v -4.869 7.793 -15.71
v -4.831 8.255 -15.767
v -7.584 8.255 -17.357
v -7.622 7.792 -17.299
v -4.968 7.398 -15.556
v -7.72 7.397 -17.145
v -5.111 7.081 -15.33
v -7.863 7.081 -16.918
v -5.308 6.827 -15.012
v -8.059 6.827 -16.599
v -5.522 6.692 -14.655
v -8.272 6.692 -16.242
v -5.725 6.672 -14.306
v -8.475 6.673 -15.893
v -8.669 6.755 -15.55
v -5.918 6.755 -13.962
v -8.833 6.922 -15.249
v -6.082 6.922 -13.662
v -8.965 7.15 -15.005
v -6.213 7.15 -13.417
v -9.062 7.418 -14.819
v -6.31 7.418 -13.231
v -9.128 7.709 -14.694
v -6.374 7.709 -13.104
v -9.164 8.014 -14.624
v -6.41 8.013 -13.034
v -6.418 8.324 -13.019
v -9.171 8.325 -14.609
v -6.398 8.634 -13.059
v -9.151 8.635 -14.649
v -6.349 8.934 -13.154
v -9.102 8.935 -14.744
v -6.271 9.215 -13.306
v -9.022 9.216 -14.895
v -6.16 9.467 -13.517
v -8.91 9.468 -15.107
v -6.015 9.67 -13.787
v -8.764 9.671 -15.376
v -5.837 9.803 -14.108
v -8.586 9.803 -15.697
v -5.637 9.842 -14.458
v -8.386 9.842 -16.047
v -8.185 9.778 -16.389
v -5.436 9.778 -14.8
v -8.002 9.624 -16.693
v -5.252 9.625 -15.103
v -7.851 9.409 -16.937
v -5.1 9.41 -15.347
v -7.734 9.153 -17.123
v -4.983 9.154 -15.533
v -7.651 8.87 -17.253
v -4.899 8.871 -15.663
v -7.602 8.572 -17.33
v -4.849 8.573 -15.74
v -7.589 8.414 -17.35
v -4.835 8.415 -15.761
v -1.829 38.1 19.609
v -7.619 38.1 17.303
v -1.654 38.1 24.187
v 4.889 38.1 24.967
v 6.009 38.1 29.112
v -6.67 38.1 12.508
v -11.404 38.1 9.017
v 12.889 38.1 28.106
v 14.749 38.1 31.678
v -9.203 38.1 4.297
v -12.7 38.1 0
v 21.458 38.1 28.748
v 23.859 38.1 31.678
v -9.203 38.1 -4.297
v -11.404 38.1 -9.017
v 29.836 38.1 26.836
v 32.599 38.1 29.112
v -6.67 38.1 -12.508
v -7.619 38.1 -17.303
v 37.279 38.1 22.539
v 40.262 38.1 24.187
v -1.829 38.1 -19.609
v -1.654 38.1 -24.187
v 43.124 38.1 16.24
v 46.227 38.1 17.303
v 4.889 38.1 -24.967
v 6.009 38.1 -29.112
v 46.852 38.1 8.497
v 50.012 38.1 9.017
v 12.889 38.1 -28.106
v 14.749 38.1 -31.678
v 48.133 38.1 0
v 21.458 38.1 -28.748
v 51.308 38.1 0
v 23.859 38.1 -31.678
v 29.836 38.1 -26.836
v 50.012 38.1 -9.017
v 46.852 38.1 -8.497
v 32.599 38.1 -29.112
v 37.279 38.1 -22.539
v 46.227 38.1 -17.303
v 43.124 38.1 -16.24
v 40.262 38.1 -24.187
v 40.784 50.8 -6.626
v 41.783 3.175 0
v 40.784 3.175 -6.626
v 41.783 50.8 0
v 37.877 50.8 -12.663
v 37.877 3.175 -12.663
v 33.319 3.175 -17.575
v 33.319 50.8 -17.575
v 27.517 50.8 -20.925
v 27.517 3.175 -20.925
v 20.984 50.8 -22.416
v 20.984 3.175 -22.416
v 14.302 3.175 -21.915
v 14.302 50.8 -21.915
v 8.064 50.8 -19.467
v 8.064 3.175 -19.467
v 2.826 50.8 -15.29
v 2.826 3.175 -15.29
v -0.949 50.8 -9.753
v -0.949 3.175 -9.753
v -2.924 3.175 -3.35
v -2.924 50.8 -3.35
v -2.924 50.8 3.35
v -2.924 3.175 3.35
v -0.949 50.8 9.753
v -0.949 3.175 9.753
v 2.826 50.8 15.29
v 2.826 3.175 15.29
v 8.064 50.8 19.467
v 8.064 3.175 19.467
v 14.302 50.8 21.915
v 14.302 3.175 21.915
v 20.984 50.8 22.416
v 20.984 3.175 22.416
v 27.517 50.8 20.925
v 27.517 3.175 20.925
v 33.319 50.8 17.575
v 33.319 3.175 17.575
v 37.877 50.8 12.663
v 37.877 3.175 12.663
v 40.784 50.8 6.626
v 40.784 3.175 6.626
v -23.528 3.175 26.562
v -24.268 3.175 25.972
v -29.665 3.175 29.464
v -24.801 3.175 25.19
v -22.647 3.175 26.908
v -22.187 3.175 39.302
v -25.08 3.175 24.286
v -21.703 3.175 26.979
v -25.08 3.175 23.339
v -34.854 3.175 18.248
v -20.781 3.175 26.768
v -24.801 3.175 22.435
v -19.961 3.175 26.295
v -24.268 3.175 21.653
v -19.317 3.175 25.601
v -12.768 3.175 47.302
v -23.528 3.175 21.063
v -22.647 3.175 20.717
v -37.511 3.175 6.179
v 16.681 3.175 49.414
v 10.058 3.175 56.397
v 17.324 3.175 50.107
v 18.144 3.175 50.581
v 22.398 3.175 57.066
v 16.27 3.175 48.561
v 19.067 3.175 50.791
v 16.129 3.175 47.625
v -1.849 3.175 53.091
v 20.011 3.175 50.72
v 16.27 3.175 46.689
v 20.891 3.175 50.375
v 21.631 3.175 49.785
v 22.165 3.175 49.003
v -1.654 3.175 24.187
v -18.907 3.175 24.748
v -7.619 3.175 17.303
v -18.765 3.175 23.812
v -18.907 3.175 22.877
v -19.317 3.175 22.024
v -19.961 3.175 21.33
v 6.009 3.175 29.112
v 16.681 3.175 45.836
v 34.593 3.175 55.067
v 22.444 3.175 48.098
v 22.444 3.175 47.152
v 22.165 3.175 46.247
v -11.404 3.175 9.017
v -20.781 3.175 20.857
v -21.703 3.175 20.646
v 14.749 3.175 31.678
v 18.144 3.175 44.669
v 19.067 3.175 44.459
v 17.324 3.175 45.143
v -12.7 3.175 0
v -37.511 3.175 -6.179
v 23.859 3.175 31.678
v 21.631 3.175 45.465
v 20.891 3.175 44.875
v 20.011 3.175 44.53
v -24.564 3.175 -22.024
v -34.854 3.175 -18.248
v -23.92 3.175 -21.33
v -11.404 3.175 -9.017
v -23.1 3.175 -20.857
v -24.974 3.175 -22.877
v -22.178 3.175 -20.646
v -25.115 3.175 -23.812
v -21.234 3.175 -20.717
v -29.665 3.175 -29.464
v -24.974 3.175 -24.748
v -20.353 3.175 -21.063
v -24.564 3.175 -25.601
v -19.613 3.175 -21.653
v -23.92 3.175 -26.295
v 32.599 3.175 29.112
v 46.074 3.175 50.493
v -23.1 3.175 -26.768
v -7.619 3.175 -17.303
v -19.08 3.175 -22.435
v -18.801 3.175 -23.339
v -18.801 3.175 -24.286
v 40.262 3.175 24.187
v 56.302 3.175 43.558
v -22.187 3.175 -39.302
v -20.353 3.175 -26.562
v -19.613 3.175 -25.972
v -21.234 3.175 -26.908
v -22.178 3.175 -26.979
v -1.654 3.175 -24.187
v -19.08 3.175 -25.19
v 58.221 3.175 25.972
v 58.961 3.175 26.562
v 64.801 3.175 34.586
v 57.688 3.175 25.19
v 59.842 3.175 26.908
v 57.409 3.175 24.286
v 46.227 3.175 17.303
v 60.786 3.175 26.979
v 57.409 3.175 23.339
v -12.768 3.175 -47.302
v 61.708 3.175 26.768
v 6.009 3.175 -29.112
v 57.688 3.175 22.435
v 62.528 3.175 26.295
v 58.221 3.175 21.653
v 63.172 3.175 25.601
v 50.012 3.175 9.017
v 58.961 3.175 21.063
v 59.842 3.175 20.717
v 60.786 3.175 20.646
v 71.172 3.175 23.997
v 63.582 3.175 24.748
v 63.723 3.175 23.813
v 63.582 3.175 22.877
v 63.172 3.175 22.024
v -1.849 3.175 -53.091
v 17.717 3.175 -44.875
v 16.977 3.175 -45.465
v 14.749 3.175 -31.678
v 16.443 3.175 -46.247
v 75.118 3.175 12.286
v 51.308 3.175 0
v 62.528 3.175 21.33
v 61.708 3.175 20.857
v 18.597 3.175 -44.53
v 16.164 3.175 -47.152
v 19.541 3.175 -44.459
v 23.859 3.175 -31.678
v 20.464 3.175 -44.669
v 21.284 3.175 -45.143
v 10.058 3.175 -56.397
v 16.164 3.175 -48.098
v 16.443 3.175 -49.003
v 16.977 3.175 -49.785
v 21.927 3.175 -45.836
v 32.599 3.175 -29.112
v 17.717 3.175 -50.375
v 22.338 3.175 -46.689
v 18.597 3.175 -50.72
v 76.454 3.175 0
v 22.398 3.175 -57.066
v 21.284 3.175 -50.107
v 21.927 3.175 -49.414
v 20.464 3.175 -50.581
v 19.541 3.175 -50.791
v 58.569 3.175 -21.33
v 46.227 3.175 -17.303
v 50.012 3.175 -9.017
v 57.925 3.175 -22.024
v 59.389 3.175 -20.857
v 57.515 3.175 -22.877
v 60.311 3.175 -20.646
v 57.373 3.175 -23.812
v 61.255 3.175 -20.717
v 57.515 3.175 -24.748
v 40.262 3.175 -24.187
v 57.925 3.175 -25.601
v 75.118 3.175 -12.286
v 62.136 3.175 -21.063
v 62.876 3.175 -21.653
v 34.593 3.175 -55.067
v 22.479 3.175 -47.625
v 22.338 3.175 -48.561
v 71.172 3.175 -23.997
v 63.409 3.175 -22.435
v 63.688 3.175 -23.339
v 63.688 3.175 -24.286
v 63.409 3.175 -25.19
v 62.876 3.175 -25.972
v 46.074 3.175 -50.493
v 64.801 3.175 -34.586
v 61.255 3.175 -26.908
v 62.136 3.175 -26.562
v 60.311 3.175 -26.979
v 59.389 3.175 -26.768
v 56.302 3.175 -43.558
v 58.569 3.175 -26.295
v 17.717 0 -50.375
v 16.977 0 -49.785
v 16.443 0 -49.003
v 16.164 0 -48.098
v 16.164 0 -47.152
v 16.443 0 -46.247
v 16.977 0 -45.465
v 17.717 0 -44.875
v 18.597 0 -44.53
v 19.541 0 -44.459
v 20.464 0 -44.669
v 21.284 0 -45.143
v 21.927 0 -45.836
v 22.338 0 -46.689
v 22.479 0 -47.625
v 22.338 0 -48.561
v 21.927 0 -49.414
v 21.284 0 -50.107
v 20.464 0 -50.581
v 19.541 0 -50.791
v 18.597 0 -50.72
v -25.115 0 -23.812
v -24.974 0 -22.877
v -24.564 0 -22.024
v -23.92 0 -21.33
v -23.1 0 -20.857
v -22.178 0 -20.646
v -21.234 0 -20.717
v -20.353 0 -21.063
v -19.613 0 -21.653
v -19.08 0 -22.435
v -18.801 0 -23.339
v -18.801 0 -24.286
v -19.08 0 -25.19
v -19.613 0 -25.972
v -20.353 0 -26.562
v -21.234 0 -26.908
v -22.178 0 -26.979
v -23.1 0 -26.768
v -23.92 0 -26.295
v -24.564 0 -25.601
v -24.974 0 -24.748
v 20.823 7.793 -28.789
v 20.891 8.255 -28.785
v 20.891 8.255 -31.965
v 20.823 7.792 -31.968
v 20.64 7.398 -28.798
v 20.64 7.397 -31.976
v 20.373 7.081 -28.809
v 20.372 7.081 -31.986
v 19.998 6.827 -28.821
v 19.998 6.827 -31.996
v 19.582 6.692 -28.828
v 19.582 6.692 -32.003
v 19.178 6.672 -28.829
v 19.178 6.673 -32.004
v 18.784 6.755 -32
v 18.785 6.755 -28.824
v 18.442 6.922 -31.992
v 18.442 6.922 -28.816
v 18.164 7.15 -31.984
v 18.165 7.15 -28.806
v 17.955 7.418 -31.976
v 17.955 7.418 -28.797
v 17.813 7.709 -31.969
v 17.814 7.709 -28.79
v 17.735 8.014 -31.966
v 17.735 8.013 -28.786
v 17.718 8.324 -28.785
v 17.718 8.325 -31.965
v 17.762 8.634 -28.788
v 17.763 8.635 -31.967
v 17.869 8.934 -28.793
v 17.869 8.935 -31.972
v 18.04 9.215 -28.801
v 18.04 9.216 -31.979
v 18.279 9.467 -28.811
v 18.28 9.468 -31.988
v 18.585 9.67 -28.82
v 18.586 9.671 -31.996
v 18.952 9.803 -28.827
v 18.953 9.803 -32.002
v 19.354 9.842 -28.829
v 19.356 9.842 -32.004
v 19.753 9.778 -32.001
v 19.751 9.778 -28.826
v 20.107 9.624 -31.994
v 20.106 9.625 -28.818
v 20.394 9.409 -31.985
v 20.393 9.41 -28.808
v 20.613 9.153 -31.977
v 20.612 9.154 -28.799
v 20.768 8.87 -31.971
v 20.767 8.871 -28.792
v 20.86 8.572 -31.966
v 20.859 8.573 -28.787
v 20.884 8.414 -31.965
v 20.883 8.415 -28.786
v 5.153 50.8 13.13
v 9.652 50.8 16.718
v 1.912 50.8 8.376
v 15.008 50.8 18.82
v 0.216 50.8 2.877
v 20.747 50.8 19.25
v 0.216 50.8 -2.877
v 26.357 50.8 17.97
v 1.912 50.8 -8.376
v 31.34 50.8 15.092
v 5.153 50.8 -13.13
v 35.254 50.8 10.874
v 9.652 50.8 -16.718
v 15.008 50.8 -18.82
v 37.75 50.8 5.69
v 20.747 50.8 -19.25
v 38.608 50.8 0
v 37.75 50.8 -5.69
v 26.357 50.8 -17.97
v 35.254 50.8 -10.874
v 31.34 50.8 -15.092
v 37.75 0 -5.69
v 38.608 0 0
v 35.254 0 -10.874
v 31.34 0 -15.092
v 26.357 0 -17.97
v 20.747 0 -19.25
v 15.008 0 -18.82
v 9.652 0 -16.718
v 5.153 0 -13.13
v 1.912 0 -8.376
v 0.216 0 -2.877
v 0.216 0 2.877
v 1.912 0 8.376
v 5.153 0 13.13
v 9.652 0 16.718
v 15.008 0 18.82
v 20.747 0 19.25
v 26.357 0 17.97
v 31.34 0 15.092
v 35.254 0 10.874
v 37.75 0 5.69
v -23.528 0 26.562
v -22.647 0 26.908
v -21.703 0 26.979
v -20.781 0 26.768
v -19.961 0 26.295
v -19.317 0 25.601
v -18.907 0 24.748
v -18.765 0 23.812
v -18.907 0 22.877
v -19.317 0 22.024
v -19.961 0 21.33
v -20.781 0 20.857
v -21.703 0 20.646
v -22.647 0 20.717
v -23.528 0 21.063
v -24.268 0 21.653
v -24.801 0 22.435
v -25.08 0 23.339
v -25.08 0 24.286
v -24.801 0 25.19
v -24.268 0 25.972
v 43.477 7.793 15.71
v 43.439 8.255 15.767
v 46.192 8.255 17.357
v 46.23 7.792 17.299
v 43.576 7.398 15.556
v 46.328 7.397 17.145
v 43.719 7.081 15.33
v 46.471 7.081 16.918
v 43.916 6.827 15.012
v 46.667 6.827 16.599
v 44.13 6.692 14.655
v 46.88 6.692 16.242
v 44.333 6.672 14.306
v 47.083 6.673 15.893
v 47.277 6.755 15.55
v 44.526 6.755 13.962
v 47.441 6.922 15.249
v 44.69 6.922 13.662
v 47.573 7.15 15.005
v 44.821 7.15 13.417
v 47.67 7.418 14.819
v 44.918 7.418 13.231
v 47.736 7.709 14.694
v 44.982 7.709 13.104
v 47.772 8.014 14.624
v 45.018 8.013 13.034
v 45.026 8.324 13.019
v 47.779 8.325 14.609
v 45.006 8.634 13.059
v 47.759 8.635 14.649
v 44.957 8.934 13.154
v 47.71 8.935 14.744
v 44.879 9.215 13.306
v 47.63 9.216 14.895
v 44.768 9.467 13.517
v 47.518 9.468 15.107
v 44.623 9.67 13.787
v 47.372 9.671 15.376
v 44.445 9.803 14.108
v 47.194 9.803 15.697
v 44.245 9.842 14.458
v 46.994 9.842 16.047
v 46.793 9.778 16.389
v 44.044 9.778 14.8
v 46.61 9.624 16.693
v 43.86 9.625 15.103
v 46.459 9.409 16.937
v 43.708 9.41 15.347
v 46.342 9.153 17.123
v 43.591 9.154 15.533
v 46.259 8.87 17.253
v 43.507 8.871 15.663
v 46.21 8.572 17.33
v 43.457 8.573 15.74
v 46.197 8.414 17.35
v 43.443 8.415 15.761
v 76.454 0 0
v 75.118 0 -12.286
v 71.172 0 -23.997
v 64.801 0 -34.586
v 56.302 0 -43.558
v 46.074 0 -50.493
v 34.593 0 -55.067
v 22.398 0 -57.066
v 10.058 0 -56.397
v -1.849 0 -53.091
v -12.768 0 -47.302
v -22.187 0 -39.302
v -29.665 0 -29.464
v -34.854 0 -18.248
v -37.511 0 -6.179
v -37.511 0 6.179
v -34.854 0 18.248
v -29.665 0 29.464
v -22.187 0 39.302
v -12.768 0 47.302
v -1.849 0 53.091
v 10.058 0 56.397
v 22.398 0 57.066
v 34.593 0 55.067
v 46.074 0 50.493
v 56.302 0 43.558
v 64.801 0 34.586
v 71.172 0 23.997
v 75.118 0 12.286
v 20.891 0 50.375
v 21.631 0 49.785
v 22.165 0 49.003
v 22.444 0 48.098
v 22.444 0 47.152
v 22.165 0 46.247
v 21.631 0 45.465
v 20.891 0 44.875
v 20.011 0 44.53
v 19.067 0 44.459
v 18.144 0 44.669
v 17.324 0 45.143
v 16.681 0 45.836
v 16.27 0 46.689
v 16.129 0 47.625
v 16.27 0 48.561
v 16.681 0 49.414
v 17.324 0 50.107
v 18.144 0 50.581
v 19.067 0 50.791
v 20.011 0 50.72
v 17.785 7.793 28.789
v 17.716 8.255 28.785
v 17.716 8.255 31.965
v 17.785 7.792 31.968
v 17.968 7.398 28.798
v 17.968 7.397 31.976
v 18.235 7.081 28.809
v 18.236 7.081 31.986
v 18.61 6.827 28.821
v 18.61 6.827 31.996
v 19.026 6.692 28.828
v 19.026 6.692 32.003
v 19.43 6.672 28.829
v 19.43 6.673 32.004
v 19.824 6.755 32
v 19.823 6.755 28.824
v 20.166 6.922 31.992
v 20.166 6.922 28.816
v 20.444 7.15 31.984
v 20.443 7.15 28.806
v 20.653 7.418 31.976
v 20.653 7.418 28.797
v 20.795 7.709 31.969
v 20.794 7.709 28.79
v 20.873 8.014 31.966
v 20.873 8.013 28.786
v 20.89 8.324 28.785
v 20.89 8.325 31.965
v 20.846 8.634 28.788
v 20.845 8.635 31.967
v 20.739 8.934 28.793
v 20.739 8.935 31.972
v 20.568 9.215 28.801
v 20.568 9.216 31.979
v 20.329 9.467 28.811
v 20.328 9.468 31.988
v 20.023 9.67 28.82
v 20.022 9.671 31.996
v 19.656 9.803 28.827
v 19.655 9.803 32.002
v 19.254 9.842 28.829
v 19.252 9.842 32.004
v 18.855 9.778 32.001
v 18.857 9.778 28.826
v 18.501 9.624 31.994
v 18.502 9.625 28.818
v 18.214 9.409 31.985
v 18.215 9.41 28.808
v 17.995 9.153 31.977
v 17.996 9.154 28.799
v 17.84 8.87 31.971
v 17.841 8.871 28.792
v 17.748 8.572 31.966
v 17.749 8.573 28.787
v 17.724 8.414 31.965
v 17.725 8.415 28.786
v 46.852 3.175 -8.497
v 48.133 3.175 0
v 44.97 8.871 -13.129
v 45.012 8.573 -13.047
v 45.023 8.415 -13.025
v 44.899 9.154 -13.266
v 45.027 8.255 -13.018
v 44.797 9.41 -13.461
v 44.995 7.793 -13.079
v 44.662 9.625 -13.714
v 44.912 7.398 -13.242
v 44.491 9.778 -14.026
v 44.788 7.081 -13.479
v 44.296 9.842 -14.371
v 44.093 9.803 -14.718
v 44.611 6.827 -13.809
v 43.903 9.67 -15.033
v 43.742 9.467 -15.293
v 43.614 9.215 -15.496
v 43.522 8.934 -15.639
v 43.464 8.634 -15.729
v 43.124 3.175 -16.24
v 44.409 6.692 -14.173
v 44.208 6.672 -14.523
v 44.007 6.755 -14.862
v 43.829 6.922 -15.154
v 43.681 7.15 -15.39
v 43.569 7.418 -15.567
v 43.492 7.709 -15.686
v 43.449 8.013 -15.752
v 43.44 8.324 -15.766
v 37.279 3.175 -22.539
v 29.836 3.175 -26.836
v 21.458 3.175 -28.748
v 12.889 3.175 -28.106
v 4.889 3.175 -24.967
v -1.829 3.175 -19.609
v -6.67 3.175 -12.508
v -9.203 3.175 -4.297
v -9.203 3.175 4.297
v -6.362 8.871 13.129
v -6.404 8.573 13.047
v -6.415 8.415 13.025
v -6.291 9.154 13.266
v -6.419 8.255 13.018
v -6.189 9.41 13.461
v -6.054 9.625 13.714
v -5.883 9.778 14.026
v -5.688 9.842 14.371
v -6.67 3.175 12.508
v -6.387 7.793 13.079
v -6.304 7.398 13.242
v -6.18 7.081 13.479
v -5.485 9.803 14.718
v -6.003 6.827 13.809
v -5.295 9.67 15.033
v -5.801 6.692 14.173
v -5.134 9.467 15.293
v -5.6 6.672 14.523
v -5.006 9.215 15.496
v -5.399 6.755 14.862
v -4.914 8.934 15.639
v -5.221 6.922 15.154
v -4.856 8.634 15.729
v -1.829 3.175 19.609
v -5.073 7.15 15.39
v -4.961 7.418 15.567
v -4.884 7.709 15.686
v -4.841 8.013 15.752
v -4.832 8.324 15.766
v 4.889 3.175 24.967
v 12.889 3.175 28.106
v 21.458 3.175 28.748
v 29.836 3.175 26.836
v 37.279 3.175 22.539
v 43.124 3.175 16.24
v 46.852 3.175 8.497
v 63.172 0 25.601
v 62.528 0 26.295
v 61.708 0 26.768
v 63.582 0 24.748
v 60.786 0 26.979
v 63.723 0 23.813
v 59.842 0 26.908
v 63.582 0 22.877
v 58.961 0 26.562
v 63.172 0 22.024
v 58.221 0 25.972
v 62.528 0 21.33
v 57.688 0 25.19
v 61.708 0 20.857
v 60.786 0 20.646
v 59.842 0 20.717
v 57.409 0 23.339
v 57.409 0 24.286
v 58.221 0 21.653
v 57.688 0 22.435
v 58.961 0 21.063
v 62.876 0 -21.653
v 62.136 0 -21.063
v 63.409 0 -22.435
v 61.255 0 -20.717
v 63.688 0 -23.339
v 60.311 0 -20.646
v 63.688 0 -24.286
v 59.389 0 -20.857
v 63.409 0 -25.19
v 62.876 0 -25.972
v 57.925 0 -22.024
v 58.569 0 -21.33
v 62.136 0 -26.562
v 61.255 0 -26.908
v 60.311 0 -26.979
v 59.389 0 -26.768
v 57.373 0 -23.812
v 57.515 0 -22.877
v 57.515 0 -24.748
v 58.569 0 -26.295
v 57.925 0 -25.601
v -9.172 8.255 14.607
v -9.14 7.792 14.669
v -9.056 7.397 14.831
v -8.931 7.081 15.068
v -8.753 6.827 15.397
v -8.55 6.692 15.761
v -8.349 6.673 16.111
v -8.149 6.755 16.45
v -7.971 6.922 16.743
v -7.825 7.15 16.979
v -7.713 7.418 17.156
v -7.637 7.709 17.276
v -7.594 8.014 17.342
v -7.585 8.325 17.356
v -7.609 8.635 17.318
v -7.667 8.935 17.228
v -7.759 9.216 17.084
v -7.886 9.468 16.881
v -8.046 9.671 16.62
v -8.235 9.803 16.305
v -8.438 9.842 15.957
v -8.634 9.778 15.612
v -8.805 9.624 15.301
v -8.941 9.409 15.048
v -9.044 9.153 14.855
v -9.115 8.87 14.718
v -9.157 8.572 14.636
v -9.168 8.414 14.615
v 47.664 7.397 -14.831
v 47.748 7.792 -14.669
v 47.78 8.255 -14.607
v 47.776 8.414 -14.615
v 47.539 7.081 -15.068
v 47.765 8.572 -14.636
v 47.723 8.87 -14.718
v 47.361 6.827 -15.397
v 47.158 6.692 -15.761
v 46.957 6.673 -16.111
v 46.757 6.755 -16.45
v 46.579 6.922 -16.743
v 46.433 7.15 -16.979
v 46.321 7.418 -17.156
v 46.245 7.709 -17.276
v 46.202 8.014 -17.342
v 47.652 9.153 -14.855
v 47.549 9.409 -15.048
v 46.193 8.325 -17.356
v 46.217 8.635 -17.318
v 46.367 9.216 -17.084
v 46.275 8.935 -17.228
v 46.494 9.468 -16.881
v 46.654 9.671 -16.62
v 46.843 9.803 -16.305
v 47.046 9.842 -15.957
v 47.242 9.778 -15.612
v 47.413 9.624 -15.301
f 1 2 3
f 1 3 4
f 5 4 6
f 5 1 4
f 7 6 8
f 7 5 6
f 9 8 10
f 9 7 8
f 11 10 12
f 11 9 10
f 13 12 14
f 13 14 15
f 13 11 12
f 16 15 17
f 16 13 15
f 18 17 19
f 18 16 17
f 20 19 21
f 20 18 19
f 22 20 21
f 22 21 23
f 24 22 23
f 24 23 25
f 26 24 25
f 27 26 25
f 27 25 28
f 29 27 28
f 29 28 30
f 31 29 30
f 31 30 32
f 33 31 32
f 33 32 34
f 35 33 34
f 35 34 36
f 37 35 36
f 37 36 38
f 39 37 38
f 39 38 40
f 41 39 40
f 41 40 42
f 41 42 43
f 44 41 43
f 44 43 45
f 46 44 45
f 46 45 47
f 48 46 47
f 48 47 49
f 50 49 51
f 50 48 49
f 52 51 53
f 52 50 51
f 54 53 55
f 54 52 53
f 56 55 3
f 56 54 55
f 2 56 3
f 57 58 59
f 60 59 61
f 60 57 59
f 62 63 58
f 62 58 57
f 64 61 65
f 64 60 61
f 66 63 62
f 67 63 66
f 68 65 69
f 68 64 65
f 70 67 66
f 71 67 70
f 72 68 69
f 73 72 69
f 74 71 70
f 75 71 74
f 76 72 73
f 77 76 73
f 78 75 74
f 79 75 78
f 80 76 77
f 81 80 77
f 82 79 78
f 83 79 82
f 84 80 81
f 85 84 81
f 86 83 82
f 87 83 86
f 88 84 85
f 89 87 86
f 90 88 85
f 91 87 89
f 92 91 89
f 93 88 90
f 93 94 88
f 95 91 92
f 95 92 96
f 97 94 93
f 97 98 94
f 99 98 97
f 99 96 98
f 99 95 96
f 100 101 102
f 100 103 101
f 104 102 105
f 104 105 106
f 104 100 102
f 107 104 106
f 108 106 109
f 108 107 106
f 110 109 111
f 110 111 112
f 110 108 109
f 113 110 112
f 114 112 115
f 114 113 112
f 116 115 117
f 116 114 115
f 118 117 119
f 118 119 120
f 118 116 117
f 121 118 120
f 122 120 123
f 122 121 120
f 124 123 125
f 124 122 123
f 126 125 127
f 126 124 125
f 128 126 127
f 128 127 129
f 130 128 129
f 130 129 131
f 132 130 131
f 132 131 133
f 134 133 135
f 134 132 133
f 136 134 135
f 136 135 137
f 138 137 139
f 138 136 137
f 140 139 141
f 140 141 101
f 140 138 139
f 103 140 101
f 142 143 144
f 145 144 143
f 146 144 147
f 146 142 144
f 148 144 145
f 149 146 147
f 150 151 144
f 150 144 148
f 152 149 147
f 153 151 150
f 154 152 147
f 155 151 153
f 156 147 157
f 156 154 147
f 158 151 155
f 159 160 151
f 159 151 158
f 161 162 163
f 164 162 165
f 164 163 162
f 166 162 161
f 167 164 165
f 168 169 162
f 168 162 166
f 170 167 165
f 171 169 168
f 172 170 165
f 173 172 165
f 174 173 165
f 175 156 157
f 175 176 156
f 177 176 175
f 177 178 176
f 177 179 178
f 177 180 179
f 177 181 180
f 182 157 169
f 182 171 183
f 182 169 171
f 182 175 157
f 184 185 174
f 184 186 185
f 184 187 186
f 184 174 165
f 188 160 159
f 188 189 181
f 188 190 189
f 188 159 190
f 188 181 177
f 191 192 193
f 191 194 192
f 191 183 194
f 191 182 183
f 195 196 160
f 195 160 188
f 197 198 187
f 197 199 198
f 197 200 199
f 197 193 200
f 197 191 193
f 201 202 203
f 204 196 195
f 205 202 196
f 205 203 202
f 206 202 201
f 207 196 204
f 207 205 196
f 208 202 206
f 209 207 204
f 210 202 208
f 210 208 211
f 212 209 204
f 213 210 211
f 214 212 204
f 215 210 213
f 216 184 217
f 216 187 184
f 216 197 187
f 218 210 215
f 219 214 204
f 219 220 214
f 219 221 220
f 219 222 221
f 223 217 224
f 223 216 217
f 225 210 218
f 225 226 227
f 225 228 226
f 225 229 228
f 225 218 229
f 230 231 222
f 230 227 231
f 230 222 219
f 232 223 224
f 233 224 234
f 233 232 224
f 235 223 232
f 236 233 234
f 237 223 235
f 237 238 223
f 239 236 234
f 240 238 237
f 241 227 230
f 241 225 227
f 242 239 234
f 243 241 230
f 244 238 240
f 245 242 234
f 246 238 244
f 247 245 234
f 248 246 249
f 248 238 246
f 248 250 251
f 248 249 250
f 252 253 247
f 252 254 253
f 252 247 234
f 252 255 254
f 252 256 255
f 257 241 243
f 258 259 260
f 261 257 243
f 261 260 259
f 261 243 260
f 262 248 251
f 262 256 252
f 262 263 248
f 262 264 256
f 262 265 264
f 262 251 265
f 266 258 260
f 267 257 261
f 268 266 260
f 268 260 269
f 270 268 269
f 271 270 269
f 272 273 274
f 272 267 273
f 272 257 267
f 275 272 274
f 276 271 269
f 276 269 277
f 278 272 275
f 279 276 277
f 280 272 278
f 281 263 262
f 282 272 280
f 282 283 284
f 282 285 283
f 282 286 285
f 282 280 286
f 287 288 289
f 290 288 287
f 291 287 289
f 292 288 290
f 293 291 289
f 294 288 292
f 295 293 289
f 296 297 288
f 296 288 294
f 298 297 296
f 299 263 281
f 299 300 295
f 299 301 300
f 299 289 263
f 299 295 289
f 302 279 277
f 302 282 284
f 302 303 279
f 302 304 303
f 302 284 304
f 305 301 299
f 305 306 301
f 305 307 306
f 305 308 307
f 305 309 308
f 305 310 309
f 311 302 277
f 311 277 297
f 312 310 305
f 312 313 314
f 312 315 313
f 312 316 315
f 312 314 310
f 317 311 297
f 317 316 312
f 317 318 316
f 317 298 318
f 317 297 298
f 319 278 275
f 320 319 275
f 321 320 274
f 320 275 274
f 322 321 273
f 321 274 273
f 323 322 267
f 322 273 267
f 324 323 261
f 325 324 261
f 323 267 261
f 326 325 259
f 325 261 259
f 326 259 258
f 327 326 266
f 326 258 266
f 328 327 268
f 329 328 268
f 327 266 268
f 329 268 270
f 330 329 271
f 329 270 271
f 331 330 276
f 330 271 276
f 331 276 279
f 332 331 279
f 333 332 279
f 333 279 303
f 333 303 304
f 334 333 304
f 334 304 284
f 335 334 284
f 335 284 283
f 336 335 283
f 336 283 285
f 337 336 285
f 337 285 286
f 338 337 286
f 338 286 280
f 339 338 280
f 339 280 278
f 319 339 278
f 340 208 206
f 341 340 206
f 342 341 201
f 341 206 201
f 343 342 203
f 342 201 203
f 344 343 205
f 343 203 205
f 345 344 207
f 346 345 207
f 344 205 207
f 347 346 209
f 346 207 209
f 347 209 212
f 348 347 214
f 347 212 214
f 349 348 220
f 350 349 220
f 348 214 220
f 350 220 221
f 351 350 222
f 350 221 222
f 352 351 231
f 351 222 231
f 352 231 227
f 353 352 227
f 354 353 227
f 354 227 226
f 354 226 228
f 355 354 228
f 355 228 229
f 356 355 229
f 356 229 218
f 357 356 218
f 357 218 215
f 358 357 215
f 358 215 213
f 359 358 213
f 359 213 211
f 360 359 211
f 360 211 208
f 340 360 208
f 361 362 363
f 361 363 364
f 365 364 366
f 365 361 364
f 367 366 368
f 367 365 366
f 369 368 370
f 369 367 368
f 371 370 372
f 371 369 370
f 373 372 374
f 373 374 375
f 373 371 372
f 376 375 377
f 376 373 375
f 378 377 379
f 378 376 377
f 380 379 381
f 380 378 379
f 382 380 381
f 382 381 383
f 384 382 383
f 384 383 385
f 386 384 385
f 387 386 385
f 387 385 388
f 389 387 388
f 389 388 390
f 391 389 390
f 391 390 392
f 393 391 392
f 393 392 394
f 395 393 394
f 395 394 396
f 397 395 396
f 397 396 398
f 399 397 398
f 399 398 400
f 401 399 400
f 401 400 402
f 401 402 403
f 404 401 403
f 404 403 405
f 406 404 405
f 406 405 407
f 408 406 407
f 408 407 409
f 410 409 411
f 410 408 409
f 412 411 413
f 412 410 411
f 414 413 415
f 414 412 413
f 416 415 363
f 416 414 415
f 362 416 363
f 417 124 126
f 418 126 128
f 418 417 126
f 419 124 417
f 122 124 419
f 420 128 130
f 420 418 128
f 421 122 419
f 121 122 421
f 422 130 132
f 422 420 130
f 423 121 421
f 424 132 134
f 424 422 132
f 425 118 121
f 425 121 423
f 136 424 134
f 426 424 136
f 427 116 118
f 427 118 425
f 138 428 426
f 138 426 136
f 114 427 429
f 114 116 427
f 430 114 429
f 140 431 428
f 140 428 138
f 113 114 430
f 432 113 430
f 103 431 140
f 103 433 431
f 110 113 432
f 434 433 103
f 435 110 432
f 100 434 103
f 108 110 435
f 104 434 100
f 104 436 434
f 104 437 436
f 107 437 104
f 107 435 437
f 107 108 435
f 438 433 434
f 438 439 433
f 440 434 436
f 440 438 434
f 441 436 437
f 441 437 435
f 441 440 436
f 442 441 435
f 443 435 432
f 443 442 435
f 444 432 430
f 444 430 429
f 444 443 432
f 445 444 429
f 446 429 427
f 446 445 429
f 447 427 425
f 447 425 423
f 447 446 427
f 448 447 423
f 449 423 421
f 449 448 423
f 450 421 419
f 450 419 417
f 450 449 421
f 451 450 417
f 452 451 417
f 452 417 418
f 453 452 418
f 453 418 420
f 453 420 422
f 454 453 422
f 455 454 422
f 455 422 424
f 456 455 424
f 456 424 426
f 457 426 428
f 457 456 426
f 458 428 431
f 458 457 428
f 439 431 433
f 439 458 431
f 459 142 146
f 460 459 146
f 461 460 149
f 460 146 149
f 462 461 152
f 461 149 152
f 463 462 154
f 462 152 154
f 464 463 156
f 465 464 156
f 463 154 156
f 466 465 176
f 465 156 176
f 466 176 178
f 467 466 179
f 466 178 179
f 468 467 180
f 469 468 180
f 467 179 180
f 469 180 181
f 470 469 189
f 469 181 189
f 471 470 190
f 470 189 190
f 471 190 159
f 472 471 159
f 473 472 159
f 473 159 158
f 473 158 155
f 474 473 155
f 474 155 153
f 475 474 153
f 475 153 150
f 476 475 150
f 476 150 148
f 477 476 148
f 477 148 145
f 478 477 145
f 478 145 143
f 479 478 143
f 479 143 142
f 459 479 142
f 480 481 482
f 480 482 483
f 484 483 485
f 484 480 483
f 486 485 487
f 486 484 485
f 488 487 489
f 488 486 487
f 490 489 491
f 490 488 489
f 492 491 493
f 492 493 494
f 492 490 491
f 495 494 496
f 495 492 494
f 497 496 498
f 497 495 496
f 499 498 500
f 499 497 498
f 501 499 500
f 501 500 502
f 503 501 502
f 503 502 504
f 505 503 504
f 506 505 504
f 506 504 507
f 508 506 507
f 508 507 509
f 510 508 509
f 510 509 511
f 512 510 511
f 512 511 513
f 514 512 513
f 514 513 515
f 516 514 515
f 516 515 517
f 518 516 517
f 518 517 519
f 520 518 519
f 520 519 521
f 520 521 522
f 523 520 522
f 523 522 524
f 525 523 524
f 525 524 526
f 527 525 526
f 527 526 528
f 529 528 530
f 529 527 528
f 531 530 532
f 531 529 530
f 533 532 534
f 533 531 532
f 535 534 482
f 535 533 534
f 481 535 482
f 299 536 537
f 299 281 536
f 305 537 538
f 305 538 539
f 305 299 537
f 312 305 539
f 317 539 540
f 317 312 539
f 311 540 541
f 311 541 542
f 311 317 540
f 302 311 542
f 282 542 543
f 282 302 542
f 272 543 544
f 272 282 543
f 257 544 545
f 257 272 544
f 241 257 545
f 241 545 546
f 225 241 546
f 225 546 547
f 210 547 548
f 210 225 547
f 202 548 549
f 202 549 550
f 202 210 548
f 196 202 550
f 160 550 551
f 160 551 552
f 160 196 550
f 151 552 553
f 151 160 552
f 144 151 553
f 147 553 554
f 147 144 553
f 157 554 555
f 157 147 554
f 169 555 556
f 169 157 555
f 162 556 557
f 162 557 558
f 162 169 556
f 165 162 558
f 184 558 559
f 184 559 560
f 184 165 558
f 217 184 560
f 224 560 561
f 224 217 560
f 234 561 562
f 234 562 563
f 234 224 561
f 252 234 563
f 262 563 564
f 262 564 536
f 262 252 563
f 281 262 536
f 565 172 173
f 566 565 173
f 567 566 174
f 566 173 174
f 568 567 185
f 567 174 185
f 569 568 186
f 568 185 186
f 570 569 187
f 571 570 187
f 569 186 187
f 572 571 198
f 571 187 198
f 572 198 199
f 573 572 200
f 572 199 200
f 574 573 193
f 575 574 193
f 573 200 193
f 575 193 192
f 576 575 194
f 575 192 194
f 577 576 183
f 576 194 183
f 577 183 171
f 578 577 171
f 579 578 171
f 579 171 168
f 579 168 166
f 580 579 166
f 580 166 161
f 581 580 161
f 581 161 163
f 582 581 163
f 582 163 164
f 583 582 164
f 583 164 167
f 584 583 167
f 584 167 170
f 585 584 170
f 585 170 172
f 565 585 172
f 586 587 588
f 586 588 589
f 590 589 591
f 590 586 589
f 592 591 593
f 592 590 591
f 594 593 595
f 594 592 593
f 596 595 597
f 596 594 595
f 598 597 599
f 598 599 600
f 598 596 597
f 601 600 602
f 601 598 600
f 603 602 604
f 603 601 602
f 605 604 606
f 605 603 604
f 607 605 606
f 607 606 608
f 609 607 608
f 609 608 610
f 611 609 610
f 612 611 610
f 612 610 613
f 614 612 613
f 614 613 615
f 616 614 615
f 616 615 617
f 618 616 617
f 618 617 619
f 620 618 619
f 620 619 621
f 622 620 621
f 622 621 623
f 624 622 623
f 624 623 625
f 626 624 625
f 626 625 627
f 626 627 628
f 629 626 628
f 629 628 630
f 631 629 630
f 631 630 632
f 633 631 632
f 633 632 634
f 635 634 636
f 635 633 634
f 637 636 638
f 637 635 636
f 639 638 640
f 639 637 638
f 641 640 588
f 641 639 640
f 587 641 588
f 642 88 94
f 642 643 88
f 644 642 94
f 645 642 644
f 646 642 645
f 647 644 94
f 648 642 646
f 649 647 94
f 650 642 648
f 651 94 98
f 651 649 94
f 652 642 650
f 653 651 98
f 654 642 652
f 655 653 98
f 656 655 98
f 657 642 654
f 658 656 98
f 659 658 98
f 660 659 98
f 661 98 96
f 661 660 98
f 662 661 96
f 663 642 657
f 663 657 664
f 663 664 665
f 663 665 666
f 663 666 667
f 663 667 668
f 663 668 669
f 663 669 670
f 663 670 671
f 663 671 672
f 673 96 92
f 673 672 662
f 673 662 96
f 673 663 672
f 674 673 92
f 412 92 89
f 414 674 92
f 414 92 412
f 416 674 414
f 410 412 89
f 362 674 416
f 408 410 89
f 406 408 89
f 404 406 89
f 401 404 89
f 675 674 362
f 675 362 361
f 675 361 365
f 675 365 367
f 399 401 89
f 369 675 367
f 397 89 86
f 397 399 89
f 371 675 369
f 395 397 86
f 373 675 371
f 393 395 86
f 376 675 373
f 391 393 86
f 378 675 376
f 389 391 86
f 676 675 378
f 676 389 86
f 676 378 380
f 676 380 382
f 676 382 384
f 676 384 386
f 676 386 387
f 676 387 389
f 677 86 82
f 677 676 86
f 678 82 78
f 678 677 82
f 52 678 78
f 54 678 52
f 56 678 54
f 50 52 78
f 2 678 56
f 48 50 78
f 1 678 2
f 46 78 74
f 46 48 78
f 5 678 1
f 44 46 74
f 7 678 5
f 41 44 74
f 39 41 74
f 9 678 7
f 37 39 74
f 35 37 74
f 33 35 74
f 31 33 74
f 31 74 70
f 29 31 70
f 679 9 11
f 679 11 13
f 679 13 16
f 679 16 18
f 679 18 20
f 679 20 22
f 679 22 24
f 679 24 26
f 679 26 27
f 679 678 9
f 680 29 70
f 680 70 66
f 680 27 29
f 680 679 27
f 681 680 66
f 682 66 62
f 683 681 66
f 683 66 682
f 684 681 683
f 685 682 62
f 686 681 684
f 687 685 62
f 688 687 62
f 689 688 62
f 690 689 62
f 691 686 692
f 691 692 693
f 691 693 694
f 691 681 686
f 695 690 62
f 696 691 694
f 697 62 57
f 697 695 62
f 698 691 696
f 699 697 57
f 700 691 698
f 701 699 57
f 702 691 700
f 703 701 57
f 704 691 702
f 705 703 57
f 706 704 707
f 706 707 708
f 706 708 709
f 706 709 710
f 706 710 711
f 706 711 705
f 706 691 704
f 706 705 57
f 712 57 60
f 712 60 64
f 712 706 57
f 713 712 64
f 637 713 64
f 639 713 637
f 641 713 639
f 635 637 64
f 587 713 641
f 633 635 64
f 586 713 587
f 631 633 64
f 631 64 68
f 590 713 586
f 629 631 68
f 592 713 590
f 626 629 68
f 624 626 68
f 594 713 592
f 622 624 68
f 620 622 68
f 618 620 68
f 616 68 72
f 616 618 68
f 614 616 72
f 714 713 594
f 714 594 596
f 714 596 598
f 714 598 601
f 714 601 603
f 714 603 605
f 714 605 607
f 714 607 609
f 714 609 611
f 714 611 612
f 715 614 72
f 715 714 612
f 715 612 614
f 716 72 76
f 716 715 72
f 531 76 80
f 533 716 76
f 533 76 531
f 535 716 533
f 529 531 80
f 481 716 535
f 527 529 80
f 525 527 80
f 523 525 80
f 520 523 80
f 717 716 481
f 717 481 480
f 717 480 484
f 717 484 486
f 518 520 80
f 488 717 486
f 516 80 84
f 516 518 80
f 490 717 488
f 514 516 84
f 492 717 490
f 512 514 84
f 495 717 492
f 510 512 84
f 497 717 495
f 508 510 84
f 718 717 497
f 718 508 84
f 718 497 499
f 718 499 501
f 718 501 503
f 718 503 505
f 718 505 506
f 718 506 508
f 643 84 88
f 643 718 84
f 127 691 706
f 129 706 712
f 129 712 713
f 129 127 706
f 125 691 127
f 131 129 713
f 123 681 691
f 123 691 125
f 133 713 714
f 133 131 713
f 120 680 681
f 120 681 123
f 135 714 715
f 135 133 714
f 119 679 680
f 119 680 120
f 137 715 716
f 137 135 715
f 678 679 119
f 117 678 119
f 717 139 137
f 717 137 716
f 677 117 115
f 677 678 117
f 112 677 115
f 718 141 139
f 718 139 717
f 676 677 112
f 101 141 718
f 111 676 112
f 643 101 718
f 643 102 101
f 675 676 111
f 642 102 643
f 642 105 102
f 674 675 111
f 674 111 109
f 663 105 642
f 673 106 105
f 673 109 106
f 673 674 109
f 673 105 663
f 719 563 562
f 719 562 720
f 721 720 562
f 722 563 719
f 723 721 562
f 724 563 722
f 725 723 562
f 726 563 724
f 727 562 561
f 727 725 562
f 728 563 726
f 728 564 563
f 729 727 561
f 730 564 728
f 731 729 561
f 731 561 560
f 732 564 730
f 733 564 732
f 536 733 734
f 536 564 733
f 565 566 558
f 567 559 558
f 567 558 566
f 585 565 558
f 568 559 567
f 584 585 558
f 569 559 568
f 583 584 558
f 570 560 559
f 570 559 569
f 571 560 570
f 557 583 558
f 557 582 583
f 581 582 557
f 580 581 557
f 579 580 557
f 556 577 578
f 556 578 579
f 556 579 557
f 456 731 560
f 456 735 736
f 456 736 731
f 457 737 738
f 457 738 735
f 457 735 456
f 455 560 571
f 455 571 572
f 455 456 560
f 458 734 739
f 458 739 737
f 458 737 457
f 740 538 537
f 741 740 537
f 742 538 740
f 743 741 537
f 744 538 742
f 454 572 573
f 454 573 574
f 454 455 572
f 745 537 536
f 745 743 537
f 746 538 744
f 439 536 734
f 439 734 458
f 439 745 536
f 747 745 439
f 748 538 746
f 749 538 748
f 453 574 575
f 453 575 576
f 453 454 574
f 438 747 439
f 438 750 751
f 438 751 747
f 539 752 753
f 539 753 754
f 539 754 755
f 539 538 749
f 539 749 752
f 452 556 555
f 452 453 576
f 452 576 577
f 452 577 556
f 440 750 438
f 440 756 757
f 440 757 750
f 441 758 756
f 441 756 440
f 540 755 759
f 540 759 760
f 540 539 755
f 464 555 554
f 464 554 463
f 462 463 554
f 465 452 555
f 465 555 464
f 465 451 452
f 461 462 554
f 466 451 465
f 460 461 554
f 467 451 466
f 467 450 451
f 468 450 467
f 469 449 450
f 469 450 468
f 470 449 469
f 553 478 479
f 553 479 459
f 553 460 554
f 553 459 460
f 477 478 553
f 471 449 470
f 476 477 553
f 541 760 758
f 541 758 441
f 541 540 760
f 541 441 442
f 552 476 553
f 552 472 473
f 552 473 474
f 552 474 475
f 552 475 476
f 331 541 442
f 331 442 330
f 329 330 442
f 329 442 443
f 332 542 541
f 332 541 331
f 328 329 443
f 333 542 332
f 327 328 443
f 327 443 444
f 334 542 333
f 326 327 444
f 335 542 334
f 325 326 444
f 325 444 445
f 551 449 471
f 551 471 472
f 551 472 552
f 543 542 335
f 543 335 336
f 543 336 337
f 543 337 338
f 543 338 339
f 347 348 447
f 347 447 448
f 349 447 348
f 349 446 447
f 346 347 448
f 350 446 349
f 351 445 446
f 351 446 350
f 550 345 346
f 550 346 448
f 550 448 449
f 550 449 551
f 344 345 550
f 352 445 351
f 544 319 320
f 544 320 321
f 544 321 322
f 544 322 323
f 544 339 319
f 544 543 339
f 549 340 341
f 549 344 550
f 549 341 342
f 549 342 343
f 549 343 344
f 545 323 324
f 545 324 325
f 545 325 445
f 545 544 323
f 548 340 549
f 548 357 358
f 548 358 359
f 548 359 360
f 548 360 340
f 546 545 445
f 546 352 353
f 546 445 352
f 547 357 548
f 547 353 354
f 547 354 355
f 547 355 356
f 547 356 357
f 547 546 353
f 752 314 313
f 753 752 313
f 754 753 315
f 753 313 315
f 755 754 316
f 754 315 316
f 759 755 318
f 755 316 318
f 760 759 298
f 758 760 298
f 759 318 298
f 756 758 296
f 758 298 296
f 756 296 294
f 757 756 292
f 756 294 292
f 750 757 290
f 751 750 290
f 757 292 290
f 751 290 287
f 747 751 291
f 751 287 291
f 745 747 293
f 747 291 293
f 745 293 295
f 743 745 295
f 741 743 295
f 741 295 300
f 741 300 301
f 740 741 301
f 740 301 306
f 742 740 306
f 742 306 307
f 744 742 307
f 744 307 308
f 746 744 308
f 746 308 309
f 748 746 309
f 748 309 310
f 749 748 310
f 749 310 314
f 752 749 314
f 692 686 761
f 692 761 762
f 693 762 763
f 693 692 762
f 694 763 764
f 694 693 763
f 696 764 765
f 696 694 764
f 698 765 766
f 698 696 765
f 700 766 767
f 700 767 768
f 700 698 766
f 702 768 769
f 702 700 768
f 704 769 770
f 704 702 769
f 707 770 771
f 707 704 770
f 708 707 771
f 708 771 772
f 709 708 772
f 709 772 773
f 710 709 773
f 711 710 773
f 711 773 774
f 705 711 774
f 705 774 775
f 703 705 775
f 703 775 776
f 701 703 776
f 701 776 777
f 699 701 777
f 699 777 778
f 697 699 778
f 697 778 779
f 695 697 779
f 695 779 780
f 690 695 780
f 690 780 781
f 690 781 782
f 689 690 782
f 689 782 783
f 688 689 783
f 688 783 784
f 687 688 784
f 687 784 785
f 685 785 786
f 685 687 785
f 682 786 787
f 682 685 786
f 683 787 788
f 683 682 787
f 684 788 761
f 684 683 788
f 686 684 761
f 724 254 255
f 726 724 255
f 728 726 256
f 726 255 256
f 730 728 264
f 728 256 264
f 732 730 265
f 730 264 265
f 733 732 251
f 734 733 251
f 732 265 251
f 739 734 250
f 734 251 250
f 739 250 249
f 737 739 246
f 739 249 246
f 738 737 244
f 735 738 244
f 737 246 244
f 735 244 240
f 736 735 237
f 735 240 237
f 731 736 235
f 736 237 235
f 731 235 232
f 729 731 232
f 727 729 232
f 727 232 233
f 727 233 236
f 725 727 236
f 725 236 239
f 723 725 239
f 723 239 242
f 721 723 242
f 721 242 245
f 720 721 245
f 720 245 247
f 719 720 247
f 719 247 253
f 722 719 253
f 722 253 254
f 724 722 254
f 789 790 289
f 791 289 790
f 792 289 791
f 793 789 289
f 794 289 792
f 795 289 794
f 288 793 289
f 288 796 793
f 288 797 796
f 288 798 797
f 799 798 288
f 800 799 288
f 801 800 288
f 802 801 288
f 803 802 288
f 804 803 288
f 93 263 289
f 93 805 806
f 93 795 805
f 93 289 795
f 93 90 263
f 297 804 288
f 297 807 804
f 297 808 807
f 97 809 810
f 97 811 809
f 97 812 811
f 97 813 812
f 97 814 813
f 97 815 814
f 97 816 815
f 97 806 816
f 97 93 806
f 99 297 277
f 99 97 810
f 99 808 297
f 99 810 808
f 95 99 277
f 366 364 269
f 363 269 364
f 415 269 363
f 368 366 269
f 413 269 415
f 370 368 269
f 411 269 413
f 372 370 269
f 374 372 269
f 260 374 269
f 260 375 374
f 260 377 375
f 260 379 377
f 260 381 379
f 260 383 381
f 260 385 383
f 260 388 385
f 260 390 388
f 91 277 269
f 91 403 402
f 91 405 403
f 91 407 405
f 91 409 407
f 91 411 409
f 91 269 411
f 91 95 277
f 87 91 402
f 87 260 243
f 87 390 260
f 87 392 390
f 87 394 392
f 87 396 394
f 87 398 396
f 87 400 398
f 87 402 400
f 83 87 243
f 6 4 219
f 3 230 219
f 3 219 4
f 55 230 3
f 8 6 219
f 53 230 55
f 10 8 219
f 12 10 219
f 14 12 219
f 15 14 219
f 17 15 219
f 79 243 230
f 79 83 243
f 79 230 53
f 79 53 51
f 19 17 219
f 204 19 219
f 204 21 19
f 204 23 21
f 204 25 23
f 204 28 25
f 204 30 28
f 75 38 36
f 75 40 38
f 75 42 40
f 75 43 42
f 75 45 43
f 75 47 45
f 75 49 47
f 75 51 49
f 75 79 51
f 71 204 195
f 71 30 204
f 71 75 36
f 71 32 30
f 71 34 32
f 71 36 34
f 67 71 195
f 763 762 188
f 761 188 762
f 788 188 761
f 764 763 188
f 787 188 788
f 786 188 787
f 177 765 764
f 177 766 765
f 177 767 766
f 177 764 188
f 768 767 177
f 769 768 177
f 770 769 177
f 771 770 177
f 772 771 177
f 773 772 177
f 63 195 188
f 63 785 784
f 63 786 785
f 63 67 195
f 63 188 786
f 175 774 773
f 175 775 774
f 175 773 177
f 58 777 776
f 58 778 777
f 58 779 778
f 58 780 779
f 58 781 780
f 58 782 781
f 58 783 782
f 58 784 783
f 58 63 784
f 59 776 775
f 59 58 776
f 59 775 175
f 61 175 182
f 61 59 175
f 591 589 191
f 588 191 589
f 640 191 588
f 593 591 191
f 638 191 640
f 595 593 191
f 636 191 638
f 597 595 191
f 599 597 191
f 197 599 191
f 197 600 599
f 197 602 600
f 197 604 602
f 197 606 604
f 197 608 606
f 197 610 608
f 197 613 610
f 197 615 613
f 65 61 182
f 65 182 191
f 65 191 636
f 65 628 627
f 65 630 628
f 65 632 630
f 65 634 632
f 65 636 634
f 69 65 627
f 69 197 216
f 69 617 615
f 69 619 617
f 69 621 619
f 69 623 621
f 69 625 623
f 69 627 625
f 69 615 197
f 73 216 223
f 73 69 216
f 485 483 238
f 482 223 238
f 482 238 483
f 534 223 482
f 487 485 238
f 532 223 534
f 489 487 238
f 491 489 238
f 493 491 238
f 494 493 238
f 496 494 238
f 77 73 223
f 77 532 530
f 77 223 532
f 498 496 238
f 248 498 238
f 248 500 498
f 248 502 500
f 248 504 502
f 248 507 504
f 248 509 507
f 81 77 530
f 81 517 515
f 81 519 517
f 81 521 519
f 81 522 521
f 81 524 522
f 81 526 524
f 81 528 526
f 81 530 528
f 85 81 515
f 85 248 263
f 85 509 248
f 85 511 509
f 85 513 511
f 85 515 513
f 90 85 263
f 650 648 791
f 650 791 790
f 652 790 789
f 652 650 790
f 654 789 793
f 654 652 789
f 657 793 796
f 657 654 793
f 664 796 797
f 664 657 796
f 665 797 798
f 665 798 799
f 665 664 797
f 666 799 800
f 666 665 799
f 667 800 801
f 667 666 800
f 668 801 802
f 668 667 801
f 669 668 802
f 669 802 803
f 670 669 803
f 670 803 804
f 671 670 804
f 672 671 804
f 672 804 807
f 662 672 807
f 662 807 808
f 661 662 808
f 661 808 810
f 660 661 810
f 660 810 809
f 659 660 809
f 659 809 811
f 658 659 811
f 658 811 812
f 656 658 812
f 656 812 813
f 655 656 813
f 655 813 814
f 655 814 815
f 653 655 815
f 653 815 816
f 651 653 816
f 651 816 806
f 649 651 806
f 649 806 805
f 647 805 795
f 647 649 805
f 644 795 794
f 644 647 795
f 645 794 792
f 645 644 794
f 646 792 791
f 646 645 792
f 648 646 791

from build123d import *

# Parameters (mm, degrees)
CUT_EXTRUDE1_START = 25.4
SKETCH2_R          = 1.5875
CUT_EXTRUDE1_DEPTH = 32.512
CIRPATTERN1_COUNT  = 6
SKETCH3_R          = 3.175
CUT_EXTRUDE2_DEPTH = 50.8
CIRPATTERN2_COUNT  = 6


with BuildPart() as part:
    # Sketch1 → Revolve1 (revolve)
    with BuildSketch(Plane.XY, mode=Mode.PRIVATE) as revolve1_sk:
        Polygon((-12.7, 3.175), (-12.7, 38.1), (-9.525, 38.1), (-9.525, 3.175), (-3.175, 3.175), (-3.175, 50.8), (0, 50.8), (0, 0), (-37.846, 0), (-37.846, 3.175), align=None)
    revolve(revolve1_sk.sketch.rotate(Axis((19.304, 0, 0), (0, 1, 0)), 180), axis=Axis((19.304, 0, 0), (0, 1, 0)))

    # Sketch2 → Cut-Extrude1 (cut)
    with BuildSketch(Plane.XY.offset(CUT_EXTRUDE1_START)):
        with Locations(Location((19.304, 8.255, 0), (0, 0, 180))):
            Circle(SKETCH2_R)
    cut_extrude1 = extrude(amount=CUT_EXTRUDE1_DEPTH, mode=Mode.SUBTRACT)

    # CirPattern1: Cut-Extrude1 ×6 about axis
    cirpattern1_axis = Axis((19.304, 0, 0), (0, -1, 0))
    for i in range(1, CIRPATTERN1_COUNT):
        add(cut_extrude1.rotate(cirpattern1_axis, i * 360 / CIRPATTERN1_COUNT), mode=Mode.SUBTRACT)

    # Sketch3 → Cut-Extrude2 (cut)
    with BuildSketch(Plane(origin=(0, 3.175, 0), x_dir=(1, 0, 0), z_dir=(0, 1, 0))):
        with Locations(Location((-21.940459855, 23.8125, 0), (0, 0, 180))):
            Circle(SKETCH3_R)
    cut_extrude2 = extrude(amount=-CUT_EXTRUDE2_DEPTH, mode=Mode.SUBTRACT)

    # CirPattern2: Cut-Extrude2 ×6 about axis
    cirpattern2_axis = Axis((19.304, 0, 0), (0, 1, 0))
    for i in range(1, CIRPATTERN2_COUNT):
        add(cut_extrude2.rotate(cirpattern2_axis, i * 360 / CIRPATTERN2_COUNT), mode=Mode.SUBTRACT)


solid = part.part
